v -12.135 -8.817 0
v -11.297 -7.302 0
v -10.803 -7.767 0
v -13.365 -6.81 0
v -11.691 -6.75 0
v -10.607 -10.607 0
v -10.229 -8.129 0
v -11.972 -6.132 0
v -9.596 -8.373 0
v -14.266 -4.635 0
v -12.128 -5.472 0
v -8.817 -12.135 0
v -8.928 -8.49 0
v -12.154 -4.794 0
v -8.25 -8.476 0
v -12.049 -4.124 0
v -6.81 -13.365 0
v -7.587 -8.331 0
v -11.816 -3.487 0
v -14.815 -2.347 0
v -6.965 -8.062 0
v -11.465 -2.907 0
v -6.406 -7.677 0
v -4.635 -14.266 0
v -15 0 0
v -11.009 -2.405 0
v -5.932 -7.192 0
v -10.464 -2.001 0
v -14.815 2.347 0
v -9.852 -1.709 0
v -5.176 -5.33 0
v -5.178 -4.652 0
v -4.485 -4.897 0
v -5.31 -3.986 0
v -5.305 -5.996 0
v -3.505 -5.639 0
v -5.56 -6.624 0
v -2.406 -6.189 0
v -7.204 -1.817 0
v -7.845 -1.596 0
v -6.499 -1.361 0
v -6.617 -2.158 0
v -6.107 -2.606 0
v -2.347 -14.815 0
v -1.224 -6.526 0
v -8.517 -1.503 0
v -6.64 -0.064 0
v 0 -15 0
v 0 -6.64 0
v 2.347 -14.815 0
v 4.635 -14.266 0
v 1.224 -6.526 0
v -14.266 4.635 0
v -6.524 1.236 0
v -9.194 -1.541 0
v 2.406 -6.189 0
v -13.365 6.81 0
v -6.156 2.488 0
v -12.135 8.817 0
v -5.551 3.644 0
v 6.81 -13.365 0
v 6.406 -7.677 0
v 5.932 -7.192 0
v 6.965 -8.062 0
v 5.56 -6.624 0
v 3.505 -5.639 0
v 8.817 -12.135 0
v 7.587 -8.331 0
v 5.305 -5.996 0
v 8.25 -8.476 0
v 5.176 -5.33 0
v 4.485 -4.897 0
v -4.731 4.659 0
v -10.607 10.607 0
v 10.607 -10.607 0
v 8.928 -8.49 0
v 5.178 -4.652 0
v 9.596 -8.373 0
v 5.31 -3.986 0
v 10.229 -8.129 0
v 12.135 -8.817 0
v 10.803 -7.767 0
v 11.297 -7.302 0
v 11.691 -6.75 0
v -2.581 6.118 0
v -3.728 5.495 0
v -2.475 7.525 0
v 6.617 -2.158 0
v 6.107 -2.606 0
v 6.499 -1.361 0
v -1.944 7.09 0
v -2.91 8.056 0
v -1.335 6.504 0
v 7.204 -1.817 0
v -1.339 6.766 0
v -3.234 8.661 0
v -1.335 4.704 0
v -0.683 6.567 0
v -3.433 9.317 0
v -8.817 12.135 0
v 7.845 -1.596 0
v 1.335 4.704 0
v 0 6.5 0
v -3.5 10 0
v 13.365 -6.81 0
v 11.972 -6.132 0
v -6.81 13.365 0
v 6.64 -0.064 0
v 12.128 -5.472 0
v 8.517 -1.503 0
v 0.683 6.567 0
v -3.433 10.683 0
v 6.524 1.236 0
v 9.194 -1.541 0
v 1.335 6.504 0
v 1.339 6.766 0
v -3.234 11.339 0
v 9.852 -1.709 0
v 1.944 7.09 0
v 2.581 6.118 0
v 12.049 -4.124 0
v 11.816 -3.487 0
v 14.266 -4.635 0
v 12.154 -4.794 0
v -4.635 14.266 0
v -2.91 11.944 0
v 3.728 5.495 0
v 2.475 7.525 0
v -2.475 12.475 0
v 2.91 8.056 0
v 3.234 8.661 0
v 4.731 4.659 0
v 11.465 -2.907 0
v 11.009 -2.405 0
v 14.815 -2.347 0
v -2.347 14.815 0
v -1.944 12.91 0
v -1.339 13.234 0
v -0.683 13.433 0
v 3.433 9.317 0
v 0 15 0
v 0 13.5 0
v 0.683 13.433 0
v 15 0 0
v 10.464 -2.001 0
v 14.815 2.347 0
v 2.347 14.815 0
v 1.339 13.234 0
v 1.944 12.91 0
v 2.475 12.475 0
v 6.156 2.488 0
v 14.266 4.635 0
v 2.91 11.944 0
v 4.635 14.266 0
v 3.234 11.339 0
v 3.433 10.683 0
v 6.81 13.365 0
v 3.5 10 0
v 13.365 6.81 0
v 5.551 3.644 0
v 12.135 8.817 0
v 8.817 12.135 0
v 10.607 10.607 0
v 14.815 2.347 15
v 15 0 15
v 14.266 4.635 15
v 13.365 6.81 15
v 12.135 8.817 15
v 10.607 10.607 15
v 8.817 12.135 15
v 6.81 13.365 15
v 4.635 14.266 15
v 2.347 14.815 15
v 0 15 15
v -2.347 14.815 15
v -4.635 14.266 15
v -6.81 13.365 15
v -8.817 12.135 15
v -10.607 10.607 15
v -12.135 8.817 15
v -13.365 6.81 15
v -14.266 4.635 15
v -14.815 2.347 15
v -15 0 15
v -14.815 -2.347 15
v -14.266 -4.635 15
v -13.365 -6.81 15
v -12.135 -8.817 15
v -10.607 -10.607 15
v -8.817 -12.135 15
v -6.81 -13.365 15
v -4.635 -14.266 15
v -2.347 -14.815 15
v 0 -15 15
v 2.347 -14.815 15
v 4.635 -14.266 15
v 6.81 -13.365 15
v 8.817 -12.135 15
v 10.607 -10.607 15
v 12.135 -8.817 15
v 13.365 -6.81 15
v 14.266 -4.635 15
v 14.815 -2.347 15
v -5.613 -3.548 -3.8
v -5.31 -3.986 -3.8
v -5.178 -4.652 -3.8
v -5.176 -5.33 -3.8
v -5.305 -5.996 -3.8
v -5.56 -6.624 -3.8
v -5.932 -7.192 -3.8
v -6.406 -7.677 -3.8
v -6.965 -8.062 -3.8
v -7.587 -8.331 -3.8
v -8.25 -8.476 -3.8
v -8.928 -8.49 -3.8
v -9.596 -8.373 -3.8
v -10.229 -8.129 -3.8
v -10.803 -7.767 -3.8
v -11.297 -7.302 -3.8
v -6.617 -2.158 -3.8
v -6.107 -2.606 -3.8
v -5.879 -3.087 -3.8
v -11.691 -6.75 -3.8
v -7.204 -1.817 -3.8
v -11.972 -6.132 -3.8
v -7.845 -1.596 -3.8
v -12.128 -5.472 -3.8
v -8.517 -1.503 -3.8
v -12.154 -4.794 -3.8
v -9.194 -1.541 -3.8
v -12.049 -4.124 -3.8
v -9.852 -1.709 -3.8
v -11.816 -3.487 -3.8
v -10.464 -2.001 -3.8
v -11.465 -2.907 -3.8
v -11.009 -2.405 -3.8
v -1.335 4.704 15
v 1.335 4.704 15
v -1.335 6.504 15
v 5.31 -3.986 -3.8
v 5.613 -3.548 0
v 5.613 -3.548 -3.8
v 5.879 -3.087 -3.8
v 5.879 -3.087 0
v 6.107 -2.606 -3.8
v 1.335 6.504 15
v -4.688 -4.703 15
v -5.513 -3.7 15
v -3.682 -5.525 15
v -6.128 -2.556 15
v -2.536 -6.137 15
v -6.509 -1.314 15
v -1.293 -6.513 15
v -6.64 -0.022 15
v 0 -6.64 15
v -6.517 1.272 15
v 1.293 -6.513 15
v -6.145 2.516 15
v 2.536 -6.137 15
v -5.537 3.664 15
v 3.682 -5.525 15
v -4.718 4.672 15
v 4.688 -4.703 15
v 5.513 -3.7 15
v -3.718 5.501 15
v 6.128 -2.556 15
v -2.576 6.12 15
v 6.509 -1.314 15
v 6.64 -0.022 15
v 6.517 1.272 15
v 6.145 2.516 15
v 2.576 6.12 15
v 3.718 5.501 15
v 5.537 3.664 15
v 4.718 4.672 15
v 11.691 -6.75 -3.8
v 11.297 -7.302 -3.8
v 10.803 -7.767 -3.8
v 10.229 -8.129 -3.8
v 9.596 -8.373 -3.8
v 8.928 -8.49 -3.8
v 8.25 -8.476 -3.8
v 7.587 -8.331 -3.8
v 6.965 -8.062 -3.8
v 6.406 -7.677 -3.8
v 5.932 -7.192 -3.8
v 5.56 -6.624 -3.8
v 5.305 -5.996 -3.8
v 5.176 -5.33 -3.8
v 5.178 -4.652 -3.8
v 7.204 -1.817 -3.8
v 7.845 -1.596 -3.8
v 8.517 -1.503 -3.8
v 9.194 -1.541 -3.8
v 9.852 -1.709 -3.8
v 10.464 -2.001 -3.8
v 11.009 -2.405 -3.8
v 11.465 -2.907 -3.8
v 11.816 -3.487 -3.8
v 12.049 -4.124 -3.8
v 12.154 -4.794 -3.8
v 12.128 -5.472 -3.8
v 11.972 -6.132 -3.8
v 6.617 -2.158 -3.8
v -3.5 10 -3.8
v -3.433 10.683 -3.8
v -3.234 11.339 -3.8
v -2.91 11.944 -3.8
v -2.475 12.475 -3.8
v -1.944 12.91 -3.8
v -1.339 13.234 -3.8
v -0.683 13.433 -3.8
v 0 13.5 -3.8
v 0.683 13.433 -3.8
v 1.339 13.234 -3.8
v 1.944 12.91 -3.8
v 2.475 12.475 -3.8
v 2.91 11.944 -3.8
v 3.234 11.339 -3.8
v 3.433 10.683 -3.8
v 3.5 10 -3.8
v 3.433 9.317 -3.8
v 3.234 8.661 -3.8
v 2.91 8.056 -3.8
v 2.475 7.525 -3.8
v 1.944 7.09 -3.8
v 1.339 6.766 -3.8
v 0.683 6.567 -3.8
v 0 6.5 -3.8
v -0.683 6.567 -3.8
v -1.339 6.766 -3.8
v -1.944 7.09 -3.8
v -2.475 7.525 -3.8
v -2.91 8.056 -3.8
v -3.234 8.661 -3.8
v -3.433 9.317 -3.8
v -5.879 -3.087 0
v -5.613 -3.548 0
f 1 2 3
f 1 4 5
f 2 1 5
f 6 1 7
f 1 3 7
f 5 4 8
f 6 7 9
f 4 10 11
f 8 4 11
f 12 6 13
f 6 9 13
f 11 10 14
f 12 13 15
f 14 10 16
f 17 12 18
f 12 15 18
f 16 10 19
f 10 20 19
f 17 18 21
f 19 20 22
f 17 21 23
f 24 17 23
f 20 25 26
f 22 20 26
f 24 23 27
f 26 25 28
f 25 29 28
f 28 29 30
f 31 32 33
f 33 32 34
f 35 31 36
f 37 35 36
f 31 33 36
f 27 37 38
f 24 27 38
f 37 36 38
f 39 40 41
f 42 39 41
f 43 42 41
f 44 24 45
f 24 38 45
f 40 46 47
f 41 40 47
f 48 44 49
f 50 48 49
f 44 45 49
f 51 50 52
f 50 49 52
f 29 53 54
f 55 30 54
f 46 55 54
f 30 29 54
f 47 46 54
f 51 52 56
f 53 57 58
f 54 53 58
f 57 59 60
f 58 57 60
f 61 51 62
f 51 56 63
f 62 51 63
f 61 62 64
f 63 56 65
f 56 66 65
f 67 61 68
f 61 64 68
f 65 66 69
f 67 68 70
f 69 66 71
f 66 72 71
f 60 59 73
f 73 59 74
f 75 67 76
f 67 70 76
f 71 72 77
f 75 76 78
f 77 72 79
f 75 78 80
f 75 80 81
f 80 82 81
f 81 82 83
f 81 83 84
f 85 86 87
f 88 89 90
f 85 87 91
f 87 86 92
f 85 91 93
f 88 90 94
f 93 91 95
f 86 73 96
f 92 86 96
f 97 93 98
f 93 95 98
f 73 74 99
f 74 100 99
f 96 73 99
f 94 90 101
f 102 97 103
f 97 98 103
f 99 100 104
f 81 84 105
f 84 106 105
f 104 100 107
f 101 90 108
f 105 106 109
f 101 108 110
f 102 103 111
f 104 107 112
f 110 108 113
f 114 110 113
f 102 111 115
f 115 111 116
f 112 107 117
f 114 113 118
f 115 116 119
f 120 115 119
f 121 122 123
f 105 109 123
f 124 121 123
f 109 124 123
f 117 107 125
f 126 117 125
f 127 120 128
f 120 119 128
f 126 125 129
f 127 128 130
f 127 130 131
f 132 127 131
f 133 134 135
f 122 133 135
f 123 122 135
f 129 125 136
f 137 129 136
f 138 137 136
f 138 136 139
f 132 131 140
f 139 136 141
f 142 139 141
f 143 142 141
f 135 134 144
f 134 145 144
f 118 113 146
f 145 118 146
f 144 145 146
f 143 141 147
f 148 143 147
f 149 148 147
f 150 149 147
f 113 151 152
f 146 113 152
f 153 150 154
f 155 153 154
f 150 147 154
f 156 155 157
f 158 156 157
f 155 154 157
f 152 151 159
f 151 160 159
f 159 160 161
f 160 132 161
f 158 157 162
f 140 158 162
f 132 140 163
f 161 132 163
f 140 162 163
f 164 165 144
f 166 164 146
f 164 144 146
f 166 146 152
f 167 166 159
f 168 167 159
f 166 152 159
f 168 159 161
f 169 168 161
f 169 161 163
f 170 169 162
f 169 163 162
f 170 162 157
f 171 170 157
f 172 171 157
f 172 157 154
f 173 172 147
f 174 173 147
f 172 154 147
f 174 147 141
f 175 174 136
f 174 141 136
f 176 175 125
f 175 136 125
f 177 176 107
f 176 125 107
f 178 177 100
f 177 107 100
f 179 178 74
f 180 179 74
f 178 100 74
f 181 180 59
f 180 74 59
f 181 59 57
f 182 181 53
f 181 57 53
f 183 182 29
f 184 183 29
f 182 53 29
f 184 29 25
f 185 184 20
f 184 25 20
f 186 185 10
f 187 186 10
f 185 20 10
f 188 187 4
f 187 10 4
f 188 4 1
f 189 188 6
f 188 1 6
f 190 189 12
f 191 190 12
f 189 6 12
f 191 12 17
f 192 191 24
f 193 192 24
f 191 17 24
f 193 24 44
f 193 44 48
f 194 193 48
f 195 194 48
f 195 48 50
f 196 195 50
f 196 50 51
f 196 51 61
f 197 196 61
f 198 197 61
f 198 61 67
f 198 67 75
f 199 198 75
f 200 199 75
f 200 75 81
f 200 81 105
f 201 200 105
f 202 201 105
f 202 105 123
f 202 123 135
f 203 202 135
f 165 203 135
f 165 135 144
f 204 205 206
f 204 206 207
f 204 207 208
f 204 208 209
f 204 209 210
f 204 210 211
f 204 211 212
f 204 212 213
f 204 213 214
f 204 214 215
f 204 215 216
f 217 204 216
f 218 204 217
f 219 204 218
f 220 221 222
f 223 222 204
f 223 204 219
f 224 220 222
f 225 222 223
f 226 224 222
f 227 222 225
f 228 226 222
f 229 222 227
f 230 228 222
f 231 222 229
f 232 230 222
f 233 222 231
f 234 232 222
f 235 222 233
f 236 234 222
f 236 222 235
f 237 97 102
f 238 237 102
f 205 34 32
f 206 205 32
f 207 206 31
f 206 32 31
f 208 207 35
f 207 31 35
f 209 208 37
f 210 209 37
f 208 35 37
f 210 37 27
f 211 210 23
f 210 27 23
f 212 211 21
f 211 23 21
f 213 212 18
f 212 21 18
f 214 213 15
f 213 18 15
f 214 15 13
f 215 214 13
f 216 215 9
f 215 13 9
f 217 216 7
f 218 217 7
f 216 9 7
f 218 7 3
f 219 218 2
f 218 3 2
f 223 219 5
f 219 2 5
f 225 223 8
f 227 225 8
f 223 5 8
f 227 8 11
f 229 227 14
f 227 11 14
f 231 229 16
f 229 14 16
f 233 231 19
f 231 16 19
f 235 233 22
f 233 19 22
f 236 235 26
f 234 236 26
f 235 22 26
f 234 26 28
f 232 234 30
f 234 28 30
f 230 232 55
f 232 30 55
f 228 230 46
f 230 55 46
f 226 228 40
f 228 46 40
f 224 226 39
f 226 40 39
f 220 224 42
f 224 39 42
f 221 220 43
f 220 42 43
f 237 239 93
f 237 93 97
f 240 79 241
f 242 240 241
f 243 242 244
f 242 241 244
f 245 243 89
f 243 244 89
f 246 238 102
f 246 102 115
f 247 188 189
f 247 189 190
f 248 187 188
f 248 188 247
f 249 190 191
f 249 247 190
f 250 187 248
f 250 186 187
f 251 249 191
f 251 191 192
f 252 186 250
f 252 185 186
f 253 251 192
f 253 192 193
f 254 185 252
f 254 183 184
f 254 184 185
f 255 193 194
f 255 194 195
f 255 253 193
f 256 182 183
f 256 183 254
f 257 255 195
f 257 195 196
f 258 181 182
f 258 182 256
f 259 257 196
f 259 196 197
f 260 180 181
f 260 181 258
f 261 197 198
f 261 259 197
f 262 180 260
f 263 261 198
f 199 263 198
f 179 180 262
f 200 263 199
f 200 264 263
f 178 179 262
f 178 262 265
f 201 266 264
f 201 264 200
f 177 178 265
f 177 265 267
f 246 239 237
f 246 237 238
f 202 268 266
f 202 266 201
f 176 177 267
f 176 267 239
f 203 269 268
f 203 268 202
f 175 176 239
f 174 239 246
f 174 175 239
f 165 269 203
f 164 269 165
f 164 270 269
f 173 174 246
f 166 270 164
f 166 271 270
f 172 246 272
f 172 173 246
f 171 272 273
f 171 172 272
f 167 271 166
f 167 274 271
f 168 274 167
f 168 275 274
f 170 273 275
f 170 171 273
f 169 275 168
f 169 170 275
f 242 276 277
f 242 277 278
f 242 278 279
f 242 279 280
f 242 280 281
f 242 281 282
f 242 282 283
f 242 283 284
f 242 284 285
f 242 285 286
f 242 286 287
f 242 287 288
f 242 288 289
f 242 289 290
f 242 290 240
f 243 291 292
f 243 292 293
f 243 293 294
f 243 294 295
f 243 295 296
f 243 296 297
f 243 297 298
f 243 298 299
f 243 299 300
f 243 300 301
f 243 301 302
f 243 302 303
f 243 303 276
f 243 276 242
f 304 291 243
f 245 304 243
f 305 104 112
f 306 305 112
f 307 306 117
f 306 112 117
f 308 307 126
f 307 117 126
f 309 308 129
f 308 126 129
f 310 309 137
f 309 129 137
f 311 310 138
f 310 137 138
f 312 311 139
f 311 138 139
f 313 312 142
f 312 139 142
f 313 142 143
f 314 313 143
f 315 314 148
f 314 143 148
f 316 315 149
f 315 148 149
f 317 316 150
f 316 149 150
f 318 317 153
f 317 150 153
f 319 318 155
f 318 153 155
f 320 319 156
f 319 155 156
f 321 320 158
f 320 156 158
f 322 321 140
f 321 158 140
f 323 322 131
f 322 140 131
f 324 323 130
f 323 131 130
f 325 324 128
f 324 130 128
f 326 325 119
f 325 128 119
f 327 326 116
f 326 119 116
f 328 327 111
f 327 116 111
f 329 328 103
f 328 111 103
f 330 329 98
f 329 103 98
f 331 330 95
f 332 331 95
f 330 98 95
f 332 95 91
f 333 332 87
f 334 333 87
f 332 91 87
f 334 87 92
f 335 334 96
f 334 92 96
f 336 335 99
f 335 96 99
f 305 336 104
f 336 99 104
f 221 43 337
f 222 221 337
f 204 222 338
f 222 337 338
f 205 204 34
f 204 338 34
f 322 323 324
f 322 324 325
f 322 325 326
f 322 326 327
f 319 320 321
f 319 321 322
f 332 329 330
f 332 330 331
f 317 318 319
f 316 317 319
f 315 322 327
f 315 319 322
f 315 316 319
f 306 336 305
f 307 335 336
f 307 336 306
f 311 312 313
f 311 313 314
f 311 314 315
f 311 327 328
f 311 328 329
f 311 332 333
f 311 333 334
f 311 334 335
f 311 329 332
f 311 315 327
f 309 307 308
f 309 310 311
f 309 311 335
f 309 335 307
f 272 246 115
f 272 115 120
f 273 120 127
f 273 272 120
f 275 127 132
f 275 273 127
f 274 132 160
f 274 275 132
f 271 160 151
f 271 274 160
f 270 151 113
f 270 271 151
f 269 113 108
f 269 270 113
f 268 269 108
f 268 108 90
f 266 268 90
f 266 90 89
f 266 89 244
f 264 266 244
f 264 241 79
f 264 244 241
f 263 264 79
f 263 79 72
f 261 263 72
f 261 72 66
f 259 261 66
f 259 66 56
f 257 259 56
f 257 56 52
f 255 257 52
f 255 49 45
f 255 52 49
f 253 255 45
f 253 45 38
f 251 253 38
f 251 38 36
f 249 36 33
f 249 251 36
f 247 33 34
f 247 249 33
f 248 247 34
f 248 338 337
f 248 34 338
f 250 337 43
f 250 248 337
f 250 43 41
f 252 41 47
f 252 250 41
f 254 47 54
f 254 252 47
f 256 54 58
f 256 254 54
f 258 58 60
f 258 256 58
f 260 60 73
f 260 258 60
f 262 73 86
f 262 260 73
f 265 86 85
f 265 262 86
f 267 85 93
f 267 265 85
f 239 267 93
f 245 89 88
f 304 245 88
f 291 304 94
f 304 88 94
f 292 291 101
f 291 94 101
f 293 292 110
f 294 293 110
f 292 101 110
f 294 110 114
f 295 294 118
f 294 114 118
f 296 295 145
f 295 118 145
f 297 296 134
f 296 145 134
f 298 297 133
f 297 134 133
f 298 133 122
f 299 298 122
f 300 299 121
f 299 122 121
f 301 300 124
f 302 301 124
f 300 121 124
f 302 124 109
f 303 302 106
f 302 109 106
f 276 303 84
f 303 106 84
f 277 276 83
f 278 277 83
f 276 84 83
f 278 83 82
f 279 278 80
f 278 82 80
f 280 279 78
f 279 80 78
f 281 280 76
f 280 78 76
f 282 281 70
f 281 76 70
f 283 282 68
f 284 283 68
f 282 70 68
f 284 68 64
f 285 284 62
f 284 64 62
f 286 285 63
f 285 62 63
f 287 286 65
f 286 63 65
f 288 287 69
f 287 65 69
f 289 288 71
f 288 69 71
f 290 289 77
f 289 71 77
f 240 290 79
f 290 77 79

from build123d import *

# Parameters (mm, degrees)
GEARFACEPROFILE_R        = 15
GEARFACEEXTRUDE_DEPTH    = 15
CENTERSLOT_DEPTH         = 26.980762114
GEARCONNECTORS_OUTLINE_R = 3.5
GEARCONNECTORS_DEPTH     = 3.8


# Read off the part's stored shape, not the designer's step: GearConnectors
with BuildPart() as part:
    # GearFaceProfile → GearFaceExtrude (new body)
    with BuildSketch(Plane.XY):
        Circle(GEARFACEPROFILE_R)
    extrude(amount=GEARFACEEXTRUDE_DEPTH)

    # Sketch1 → CenterSlot (cut, through all)
    with BuildSketch(Plane.XY.offset(15)):
        with BuildLine():
            Line((-1.335, 6.504411964), (-1.335, 4.704411964))
            Line((-1.335, 4.704411964), (1.335, 4.704411964))
            Line((1.335, 4.704411964), (1.335, 6.504411964))
            ThreePointArc((1.335, 6.504411964), (0, -6.64), (-1.335, 6.504411964))
        make_face()
    extrude(amount=-CENTERSLOT_DEPTH, mode=Mode.SUBTRACT)

    # GearConnectors outline → GearConnectors (add)
    with BuildSketch(Plane(origin=(0, 0, 0), x_dir=(-1, 0, 0), z_dir=(0, 0, -1))):
        with BuildLine():
            ThreePointArc((5.310262334, -3.986315836), (11.691342952, -6.749999998), (6.107381948, -2.605664164))
            ThreePointArc((6.107381948, -2.605664164), (5.750408681, -3.32), (5.310262334, -3.986315836))
        make_face()
        with BuildLine():
            ThreePointArc((-6.107381948, -2.605664164), (-11.691342952, -6.749999998), (-5.310262334, -3.986315836))
            ThreePointArc((-5.310262334, -3.986315836), (-5.750408681, -3.32), (-6.107381948, -2.605664164))
        make_face()
        with Locations((0, 10)):
            Circle(GEARCONNECTORS_OUTLINE_R)
    extrude(amount=GEARCONNECTORS_DEPTH)


solid = part.part
